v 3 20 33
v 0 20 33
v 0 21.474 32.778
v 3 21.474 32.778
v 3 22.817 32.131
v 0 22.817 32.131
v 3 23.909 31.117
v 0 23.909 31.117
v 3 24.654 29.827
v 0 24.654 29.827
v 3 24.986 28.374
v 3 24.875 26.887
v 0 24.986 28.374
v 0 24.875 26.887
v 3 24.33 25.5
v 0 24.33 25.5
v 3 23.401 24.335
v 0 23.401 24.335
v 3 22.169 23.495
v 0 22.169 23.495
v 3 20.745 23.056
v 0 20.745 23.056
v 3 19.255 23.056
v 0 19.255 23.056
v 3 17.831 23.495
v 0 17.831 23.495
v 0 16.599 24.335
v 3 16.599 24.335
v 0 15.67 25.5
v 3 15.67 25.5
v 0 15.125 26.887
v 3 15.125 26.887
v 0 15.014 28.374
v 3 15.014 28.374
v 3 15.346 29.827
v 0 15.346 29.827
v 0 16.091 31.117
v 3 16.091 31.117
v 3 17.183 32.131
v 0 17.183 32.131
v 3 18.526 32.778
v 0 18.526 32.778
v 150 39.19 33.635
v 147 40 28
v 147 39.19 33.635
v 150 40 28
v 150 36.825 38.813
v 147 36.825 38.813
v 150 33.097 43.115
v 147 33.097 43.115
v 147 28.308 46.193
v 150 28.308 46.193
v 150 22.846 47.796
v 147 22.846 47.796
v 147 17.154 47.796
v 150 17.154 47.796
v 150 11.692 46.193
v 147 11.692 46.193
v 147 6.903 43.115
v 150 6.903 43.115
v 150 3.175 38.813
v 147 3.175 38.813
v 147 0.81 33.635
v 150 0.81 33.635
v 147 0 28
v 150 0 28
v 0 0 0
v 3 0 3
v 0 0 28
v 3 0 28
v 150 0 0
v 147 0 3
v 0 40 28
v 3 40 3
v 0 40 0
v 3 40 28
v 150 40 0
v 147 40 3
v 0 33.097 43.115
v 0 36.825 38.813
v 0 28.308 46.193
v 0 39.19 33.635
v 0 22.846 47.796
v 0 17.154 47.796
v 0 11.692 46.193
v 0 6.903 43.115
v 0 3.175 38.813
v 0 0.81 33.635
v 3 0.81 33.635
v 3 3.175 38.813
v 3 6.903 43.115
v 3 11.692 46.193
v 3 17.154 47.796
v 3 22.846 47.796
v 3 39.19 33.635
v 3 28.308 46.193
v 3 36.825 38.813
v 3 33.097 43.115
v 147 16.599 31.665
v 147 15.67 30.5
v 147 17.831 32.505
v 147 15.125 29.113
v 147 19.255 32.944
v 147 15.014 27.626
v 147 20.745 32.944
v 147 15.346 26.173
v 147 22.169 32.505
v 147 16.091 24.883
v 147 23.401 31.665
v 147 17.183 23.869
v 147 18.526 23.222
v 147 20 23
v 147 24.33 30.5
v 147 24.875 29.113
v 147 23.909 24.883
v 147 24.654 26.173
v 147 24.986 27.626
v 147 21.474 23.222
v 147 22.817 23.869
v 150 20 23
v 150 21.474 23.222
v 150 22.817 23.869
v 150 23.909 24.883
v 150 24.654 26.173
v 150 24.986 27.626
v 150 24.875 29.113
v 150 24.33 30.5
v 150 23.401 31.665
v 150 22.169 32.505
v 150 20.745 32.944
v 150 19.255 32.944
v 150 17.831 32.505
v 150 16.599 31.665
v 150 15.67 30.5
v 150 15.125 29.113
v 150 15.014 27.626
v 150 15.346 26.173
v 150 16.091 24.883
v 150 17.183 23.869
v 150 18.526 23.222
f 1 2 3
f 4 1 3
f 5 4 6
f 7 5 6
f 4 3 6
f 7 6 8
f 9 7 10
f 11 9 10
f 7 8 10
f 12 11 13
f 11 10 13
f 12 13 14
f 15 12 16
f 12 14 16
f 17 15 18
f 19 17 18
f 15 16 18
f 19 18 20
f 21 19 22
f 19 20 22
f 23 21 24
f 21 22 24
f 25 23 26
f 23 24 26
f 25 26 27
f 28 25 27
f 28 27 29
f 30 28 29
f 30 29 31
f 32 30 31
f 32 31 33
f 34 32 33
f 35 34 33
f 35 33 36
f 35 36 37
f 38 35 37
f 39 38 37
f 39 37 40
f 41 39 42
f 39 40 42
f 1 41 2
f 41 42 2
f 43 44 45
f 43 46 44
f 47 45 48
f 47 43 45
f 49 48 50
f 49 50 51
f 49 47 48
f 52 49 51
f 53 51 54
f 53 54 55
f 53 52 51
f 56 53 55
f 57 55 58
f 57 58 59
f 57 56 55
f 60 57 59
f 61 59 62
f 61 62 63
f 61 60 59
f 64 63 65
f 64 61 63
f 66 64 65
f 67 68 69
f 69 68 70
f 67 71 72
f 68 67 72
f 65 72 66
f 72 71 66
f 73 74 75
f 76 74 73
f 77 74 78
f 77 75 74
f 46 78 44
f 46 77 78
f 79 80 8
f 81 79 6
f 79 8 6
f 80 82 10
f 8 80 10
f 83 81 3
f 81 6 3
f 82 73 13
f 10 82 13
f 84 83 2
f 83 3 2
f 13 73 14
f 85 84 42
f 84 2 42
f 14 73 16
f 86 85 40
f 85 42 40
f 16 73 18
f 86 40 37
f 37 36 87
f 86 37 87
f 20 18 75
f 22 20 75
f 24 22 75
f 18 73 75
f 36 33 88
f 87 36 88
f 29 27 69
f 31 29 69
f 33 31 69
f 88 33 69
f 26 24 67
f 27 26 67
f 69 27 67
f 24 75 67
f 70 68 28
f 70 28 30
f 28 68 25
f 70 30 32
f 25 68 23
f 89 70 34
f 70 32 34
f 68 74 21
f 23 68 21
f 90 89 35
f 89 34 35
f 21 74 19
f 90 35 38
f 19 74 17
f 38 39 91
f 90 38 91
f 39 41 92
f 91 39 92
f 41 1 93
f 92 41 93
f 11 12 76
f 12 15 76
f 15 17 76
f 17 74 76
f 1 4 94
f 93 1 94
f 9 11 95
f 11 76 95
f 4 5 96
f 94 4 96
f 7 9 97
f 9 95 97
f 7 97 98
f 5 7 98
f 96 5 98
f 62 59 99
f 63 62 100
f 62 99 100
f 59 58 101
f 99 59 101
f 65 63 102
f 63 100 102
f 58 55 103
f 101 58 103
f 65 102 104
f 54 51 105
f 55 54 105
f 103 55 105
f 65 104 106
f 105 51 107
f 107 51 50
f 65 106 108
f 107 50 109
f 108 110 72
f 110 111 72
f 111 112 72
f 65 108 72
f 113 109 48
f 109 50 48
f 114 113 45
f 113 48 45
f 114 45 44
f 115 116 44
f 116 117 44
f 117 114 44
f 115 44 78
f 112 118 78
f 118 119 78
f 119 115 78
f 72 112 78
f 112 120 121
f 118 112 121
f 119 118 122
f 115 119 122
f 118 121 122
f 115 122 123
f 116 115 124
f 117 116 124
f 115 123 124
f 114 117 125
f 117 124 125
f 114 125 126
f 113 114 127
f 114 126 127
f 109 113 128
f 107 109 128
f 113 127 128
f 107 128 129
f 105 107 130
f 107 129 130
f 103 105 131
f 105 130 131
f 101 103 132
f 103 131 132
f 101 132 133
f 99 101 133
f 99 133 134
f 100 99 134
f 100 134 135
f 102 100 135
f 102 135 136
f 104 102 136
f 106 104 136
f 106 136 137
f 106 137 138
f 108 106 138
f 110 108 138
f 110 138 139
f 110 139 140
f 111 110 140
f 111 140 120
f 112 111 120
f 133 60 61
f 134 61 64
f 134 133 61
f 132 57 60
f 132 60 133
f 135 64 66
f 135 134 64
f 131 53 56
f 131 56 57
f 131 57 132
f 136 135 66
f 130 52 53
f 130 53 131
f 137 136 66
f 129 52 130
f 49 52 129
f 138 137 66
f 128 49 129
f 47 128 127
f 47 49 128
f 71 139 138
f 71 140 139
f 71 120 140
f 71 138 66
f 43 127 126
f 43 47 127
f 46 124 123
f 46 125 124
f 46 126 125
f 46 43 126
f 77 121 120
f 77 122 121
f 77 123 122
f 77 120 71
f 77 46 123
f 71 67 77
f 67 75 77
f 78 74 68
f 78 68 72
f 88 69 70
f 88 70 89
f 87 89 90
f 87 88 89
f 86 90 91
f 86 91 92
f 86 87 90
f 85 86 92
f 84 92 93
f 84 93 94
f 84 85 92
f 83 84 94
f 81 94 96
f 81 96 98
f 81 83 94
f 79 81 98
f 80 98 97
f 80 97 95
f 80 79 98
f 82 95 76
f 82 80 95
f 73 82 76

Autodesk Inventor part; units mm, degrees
ref_plane "YZ Plane" through (0, 0, 0) normal (1, 0, 0) x (0, 1, 0)
ref_plane "XZ Plane" through (0, 0, 0) normal (0, 1, 0) x (-1, 0, 0)
ref_plane "XY Plane" through (0, 0, 0) normal (0, 0, 1) x (1, 0, 0)
sketch "스케치1" plane through (0, 0, 0) normal (0, 0, 1) x (1, 0, 0)
  line L0 (0, 0) -> (150, 0)
  line L1 (150, 0) -> (150, 40)
  line L2 (150, 40) -> (0, 40)
  line L3 (0, 40) -> (0, 0)
  point P0 (150, 20)
  dimension "d0" = 40
  dimension "d1" = 150
extrude "돌출1" add sketch "스케치1" along normal blind 3
sketch "스케치2" plane through (0, 0, 0) normal (-1, 0, 0) x (0, 0, 1)
  line L0 (3, 0) -> (3, 40) projected
  line L1 (3, 40) -> (28, 40)
  line L2 (28, 0) -> (3, 0)
  line L3 (3, 0) -> (3, 40)
  arc A0 (28, 0) -> (28, 40) centre (28, 20) ccw
  circle A1 centre (28, 20) radius 5
  point P0 (0, 0)
  dimension "d5" = 10
  dimension "d6" = 25
extrude "돌출2" add sketch "스케치2" against normal blind 3
sketch "스케치3" plane through (150, 0, 0) normal (1, 0, 0) x (0, 0, -1)
  line L0 (-3, 0) -> (-3, 40) projected
  arc A0 (-28, 40) -> (-28, 0) centre (-28, 20) ccw projected
  line L1 (-3, 0) -> (-28, 0)
  line L2 (0, 40) -> (-28, 40) projected
  line L3 (-28, 40) -> (-3, 40)
  arc A1 (-28, 40) -> (-28, 0) centre (-28, 20) ccw
  circle A2 centre (-28, 20) radius 5 projected
  circle A3 centre (-28, 20) radius 5
  point P0 (0, 0)
  dimension "d10" = 10
extrude "돌출3" add sketch "스케치3" against normal blind 3
properties part number "braket"
